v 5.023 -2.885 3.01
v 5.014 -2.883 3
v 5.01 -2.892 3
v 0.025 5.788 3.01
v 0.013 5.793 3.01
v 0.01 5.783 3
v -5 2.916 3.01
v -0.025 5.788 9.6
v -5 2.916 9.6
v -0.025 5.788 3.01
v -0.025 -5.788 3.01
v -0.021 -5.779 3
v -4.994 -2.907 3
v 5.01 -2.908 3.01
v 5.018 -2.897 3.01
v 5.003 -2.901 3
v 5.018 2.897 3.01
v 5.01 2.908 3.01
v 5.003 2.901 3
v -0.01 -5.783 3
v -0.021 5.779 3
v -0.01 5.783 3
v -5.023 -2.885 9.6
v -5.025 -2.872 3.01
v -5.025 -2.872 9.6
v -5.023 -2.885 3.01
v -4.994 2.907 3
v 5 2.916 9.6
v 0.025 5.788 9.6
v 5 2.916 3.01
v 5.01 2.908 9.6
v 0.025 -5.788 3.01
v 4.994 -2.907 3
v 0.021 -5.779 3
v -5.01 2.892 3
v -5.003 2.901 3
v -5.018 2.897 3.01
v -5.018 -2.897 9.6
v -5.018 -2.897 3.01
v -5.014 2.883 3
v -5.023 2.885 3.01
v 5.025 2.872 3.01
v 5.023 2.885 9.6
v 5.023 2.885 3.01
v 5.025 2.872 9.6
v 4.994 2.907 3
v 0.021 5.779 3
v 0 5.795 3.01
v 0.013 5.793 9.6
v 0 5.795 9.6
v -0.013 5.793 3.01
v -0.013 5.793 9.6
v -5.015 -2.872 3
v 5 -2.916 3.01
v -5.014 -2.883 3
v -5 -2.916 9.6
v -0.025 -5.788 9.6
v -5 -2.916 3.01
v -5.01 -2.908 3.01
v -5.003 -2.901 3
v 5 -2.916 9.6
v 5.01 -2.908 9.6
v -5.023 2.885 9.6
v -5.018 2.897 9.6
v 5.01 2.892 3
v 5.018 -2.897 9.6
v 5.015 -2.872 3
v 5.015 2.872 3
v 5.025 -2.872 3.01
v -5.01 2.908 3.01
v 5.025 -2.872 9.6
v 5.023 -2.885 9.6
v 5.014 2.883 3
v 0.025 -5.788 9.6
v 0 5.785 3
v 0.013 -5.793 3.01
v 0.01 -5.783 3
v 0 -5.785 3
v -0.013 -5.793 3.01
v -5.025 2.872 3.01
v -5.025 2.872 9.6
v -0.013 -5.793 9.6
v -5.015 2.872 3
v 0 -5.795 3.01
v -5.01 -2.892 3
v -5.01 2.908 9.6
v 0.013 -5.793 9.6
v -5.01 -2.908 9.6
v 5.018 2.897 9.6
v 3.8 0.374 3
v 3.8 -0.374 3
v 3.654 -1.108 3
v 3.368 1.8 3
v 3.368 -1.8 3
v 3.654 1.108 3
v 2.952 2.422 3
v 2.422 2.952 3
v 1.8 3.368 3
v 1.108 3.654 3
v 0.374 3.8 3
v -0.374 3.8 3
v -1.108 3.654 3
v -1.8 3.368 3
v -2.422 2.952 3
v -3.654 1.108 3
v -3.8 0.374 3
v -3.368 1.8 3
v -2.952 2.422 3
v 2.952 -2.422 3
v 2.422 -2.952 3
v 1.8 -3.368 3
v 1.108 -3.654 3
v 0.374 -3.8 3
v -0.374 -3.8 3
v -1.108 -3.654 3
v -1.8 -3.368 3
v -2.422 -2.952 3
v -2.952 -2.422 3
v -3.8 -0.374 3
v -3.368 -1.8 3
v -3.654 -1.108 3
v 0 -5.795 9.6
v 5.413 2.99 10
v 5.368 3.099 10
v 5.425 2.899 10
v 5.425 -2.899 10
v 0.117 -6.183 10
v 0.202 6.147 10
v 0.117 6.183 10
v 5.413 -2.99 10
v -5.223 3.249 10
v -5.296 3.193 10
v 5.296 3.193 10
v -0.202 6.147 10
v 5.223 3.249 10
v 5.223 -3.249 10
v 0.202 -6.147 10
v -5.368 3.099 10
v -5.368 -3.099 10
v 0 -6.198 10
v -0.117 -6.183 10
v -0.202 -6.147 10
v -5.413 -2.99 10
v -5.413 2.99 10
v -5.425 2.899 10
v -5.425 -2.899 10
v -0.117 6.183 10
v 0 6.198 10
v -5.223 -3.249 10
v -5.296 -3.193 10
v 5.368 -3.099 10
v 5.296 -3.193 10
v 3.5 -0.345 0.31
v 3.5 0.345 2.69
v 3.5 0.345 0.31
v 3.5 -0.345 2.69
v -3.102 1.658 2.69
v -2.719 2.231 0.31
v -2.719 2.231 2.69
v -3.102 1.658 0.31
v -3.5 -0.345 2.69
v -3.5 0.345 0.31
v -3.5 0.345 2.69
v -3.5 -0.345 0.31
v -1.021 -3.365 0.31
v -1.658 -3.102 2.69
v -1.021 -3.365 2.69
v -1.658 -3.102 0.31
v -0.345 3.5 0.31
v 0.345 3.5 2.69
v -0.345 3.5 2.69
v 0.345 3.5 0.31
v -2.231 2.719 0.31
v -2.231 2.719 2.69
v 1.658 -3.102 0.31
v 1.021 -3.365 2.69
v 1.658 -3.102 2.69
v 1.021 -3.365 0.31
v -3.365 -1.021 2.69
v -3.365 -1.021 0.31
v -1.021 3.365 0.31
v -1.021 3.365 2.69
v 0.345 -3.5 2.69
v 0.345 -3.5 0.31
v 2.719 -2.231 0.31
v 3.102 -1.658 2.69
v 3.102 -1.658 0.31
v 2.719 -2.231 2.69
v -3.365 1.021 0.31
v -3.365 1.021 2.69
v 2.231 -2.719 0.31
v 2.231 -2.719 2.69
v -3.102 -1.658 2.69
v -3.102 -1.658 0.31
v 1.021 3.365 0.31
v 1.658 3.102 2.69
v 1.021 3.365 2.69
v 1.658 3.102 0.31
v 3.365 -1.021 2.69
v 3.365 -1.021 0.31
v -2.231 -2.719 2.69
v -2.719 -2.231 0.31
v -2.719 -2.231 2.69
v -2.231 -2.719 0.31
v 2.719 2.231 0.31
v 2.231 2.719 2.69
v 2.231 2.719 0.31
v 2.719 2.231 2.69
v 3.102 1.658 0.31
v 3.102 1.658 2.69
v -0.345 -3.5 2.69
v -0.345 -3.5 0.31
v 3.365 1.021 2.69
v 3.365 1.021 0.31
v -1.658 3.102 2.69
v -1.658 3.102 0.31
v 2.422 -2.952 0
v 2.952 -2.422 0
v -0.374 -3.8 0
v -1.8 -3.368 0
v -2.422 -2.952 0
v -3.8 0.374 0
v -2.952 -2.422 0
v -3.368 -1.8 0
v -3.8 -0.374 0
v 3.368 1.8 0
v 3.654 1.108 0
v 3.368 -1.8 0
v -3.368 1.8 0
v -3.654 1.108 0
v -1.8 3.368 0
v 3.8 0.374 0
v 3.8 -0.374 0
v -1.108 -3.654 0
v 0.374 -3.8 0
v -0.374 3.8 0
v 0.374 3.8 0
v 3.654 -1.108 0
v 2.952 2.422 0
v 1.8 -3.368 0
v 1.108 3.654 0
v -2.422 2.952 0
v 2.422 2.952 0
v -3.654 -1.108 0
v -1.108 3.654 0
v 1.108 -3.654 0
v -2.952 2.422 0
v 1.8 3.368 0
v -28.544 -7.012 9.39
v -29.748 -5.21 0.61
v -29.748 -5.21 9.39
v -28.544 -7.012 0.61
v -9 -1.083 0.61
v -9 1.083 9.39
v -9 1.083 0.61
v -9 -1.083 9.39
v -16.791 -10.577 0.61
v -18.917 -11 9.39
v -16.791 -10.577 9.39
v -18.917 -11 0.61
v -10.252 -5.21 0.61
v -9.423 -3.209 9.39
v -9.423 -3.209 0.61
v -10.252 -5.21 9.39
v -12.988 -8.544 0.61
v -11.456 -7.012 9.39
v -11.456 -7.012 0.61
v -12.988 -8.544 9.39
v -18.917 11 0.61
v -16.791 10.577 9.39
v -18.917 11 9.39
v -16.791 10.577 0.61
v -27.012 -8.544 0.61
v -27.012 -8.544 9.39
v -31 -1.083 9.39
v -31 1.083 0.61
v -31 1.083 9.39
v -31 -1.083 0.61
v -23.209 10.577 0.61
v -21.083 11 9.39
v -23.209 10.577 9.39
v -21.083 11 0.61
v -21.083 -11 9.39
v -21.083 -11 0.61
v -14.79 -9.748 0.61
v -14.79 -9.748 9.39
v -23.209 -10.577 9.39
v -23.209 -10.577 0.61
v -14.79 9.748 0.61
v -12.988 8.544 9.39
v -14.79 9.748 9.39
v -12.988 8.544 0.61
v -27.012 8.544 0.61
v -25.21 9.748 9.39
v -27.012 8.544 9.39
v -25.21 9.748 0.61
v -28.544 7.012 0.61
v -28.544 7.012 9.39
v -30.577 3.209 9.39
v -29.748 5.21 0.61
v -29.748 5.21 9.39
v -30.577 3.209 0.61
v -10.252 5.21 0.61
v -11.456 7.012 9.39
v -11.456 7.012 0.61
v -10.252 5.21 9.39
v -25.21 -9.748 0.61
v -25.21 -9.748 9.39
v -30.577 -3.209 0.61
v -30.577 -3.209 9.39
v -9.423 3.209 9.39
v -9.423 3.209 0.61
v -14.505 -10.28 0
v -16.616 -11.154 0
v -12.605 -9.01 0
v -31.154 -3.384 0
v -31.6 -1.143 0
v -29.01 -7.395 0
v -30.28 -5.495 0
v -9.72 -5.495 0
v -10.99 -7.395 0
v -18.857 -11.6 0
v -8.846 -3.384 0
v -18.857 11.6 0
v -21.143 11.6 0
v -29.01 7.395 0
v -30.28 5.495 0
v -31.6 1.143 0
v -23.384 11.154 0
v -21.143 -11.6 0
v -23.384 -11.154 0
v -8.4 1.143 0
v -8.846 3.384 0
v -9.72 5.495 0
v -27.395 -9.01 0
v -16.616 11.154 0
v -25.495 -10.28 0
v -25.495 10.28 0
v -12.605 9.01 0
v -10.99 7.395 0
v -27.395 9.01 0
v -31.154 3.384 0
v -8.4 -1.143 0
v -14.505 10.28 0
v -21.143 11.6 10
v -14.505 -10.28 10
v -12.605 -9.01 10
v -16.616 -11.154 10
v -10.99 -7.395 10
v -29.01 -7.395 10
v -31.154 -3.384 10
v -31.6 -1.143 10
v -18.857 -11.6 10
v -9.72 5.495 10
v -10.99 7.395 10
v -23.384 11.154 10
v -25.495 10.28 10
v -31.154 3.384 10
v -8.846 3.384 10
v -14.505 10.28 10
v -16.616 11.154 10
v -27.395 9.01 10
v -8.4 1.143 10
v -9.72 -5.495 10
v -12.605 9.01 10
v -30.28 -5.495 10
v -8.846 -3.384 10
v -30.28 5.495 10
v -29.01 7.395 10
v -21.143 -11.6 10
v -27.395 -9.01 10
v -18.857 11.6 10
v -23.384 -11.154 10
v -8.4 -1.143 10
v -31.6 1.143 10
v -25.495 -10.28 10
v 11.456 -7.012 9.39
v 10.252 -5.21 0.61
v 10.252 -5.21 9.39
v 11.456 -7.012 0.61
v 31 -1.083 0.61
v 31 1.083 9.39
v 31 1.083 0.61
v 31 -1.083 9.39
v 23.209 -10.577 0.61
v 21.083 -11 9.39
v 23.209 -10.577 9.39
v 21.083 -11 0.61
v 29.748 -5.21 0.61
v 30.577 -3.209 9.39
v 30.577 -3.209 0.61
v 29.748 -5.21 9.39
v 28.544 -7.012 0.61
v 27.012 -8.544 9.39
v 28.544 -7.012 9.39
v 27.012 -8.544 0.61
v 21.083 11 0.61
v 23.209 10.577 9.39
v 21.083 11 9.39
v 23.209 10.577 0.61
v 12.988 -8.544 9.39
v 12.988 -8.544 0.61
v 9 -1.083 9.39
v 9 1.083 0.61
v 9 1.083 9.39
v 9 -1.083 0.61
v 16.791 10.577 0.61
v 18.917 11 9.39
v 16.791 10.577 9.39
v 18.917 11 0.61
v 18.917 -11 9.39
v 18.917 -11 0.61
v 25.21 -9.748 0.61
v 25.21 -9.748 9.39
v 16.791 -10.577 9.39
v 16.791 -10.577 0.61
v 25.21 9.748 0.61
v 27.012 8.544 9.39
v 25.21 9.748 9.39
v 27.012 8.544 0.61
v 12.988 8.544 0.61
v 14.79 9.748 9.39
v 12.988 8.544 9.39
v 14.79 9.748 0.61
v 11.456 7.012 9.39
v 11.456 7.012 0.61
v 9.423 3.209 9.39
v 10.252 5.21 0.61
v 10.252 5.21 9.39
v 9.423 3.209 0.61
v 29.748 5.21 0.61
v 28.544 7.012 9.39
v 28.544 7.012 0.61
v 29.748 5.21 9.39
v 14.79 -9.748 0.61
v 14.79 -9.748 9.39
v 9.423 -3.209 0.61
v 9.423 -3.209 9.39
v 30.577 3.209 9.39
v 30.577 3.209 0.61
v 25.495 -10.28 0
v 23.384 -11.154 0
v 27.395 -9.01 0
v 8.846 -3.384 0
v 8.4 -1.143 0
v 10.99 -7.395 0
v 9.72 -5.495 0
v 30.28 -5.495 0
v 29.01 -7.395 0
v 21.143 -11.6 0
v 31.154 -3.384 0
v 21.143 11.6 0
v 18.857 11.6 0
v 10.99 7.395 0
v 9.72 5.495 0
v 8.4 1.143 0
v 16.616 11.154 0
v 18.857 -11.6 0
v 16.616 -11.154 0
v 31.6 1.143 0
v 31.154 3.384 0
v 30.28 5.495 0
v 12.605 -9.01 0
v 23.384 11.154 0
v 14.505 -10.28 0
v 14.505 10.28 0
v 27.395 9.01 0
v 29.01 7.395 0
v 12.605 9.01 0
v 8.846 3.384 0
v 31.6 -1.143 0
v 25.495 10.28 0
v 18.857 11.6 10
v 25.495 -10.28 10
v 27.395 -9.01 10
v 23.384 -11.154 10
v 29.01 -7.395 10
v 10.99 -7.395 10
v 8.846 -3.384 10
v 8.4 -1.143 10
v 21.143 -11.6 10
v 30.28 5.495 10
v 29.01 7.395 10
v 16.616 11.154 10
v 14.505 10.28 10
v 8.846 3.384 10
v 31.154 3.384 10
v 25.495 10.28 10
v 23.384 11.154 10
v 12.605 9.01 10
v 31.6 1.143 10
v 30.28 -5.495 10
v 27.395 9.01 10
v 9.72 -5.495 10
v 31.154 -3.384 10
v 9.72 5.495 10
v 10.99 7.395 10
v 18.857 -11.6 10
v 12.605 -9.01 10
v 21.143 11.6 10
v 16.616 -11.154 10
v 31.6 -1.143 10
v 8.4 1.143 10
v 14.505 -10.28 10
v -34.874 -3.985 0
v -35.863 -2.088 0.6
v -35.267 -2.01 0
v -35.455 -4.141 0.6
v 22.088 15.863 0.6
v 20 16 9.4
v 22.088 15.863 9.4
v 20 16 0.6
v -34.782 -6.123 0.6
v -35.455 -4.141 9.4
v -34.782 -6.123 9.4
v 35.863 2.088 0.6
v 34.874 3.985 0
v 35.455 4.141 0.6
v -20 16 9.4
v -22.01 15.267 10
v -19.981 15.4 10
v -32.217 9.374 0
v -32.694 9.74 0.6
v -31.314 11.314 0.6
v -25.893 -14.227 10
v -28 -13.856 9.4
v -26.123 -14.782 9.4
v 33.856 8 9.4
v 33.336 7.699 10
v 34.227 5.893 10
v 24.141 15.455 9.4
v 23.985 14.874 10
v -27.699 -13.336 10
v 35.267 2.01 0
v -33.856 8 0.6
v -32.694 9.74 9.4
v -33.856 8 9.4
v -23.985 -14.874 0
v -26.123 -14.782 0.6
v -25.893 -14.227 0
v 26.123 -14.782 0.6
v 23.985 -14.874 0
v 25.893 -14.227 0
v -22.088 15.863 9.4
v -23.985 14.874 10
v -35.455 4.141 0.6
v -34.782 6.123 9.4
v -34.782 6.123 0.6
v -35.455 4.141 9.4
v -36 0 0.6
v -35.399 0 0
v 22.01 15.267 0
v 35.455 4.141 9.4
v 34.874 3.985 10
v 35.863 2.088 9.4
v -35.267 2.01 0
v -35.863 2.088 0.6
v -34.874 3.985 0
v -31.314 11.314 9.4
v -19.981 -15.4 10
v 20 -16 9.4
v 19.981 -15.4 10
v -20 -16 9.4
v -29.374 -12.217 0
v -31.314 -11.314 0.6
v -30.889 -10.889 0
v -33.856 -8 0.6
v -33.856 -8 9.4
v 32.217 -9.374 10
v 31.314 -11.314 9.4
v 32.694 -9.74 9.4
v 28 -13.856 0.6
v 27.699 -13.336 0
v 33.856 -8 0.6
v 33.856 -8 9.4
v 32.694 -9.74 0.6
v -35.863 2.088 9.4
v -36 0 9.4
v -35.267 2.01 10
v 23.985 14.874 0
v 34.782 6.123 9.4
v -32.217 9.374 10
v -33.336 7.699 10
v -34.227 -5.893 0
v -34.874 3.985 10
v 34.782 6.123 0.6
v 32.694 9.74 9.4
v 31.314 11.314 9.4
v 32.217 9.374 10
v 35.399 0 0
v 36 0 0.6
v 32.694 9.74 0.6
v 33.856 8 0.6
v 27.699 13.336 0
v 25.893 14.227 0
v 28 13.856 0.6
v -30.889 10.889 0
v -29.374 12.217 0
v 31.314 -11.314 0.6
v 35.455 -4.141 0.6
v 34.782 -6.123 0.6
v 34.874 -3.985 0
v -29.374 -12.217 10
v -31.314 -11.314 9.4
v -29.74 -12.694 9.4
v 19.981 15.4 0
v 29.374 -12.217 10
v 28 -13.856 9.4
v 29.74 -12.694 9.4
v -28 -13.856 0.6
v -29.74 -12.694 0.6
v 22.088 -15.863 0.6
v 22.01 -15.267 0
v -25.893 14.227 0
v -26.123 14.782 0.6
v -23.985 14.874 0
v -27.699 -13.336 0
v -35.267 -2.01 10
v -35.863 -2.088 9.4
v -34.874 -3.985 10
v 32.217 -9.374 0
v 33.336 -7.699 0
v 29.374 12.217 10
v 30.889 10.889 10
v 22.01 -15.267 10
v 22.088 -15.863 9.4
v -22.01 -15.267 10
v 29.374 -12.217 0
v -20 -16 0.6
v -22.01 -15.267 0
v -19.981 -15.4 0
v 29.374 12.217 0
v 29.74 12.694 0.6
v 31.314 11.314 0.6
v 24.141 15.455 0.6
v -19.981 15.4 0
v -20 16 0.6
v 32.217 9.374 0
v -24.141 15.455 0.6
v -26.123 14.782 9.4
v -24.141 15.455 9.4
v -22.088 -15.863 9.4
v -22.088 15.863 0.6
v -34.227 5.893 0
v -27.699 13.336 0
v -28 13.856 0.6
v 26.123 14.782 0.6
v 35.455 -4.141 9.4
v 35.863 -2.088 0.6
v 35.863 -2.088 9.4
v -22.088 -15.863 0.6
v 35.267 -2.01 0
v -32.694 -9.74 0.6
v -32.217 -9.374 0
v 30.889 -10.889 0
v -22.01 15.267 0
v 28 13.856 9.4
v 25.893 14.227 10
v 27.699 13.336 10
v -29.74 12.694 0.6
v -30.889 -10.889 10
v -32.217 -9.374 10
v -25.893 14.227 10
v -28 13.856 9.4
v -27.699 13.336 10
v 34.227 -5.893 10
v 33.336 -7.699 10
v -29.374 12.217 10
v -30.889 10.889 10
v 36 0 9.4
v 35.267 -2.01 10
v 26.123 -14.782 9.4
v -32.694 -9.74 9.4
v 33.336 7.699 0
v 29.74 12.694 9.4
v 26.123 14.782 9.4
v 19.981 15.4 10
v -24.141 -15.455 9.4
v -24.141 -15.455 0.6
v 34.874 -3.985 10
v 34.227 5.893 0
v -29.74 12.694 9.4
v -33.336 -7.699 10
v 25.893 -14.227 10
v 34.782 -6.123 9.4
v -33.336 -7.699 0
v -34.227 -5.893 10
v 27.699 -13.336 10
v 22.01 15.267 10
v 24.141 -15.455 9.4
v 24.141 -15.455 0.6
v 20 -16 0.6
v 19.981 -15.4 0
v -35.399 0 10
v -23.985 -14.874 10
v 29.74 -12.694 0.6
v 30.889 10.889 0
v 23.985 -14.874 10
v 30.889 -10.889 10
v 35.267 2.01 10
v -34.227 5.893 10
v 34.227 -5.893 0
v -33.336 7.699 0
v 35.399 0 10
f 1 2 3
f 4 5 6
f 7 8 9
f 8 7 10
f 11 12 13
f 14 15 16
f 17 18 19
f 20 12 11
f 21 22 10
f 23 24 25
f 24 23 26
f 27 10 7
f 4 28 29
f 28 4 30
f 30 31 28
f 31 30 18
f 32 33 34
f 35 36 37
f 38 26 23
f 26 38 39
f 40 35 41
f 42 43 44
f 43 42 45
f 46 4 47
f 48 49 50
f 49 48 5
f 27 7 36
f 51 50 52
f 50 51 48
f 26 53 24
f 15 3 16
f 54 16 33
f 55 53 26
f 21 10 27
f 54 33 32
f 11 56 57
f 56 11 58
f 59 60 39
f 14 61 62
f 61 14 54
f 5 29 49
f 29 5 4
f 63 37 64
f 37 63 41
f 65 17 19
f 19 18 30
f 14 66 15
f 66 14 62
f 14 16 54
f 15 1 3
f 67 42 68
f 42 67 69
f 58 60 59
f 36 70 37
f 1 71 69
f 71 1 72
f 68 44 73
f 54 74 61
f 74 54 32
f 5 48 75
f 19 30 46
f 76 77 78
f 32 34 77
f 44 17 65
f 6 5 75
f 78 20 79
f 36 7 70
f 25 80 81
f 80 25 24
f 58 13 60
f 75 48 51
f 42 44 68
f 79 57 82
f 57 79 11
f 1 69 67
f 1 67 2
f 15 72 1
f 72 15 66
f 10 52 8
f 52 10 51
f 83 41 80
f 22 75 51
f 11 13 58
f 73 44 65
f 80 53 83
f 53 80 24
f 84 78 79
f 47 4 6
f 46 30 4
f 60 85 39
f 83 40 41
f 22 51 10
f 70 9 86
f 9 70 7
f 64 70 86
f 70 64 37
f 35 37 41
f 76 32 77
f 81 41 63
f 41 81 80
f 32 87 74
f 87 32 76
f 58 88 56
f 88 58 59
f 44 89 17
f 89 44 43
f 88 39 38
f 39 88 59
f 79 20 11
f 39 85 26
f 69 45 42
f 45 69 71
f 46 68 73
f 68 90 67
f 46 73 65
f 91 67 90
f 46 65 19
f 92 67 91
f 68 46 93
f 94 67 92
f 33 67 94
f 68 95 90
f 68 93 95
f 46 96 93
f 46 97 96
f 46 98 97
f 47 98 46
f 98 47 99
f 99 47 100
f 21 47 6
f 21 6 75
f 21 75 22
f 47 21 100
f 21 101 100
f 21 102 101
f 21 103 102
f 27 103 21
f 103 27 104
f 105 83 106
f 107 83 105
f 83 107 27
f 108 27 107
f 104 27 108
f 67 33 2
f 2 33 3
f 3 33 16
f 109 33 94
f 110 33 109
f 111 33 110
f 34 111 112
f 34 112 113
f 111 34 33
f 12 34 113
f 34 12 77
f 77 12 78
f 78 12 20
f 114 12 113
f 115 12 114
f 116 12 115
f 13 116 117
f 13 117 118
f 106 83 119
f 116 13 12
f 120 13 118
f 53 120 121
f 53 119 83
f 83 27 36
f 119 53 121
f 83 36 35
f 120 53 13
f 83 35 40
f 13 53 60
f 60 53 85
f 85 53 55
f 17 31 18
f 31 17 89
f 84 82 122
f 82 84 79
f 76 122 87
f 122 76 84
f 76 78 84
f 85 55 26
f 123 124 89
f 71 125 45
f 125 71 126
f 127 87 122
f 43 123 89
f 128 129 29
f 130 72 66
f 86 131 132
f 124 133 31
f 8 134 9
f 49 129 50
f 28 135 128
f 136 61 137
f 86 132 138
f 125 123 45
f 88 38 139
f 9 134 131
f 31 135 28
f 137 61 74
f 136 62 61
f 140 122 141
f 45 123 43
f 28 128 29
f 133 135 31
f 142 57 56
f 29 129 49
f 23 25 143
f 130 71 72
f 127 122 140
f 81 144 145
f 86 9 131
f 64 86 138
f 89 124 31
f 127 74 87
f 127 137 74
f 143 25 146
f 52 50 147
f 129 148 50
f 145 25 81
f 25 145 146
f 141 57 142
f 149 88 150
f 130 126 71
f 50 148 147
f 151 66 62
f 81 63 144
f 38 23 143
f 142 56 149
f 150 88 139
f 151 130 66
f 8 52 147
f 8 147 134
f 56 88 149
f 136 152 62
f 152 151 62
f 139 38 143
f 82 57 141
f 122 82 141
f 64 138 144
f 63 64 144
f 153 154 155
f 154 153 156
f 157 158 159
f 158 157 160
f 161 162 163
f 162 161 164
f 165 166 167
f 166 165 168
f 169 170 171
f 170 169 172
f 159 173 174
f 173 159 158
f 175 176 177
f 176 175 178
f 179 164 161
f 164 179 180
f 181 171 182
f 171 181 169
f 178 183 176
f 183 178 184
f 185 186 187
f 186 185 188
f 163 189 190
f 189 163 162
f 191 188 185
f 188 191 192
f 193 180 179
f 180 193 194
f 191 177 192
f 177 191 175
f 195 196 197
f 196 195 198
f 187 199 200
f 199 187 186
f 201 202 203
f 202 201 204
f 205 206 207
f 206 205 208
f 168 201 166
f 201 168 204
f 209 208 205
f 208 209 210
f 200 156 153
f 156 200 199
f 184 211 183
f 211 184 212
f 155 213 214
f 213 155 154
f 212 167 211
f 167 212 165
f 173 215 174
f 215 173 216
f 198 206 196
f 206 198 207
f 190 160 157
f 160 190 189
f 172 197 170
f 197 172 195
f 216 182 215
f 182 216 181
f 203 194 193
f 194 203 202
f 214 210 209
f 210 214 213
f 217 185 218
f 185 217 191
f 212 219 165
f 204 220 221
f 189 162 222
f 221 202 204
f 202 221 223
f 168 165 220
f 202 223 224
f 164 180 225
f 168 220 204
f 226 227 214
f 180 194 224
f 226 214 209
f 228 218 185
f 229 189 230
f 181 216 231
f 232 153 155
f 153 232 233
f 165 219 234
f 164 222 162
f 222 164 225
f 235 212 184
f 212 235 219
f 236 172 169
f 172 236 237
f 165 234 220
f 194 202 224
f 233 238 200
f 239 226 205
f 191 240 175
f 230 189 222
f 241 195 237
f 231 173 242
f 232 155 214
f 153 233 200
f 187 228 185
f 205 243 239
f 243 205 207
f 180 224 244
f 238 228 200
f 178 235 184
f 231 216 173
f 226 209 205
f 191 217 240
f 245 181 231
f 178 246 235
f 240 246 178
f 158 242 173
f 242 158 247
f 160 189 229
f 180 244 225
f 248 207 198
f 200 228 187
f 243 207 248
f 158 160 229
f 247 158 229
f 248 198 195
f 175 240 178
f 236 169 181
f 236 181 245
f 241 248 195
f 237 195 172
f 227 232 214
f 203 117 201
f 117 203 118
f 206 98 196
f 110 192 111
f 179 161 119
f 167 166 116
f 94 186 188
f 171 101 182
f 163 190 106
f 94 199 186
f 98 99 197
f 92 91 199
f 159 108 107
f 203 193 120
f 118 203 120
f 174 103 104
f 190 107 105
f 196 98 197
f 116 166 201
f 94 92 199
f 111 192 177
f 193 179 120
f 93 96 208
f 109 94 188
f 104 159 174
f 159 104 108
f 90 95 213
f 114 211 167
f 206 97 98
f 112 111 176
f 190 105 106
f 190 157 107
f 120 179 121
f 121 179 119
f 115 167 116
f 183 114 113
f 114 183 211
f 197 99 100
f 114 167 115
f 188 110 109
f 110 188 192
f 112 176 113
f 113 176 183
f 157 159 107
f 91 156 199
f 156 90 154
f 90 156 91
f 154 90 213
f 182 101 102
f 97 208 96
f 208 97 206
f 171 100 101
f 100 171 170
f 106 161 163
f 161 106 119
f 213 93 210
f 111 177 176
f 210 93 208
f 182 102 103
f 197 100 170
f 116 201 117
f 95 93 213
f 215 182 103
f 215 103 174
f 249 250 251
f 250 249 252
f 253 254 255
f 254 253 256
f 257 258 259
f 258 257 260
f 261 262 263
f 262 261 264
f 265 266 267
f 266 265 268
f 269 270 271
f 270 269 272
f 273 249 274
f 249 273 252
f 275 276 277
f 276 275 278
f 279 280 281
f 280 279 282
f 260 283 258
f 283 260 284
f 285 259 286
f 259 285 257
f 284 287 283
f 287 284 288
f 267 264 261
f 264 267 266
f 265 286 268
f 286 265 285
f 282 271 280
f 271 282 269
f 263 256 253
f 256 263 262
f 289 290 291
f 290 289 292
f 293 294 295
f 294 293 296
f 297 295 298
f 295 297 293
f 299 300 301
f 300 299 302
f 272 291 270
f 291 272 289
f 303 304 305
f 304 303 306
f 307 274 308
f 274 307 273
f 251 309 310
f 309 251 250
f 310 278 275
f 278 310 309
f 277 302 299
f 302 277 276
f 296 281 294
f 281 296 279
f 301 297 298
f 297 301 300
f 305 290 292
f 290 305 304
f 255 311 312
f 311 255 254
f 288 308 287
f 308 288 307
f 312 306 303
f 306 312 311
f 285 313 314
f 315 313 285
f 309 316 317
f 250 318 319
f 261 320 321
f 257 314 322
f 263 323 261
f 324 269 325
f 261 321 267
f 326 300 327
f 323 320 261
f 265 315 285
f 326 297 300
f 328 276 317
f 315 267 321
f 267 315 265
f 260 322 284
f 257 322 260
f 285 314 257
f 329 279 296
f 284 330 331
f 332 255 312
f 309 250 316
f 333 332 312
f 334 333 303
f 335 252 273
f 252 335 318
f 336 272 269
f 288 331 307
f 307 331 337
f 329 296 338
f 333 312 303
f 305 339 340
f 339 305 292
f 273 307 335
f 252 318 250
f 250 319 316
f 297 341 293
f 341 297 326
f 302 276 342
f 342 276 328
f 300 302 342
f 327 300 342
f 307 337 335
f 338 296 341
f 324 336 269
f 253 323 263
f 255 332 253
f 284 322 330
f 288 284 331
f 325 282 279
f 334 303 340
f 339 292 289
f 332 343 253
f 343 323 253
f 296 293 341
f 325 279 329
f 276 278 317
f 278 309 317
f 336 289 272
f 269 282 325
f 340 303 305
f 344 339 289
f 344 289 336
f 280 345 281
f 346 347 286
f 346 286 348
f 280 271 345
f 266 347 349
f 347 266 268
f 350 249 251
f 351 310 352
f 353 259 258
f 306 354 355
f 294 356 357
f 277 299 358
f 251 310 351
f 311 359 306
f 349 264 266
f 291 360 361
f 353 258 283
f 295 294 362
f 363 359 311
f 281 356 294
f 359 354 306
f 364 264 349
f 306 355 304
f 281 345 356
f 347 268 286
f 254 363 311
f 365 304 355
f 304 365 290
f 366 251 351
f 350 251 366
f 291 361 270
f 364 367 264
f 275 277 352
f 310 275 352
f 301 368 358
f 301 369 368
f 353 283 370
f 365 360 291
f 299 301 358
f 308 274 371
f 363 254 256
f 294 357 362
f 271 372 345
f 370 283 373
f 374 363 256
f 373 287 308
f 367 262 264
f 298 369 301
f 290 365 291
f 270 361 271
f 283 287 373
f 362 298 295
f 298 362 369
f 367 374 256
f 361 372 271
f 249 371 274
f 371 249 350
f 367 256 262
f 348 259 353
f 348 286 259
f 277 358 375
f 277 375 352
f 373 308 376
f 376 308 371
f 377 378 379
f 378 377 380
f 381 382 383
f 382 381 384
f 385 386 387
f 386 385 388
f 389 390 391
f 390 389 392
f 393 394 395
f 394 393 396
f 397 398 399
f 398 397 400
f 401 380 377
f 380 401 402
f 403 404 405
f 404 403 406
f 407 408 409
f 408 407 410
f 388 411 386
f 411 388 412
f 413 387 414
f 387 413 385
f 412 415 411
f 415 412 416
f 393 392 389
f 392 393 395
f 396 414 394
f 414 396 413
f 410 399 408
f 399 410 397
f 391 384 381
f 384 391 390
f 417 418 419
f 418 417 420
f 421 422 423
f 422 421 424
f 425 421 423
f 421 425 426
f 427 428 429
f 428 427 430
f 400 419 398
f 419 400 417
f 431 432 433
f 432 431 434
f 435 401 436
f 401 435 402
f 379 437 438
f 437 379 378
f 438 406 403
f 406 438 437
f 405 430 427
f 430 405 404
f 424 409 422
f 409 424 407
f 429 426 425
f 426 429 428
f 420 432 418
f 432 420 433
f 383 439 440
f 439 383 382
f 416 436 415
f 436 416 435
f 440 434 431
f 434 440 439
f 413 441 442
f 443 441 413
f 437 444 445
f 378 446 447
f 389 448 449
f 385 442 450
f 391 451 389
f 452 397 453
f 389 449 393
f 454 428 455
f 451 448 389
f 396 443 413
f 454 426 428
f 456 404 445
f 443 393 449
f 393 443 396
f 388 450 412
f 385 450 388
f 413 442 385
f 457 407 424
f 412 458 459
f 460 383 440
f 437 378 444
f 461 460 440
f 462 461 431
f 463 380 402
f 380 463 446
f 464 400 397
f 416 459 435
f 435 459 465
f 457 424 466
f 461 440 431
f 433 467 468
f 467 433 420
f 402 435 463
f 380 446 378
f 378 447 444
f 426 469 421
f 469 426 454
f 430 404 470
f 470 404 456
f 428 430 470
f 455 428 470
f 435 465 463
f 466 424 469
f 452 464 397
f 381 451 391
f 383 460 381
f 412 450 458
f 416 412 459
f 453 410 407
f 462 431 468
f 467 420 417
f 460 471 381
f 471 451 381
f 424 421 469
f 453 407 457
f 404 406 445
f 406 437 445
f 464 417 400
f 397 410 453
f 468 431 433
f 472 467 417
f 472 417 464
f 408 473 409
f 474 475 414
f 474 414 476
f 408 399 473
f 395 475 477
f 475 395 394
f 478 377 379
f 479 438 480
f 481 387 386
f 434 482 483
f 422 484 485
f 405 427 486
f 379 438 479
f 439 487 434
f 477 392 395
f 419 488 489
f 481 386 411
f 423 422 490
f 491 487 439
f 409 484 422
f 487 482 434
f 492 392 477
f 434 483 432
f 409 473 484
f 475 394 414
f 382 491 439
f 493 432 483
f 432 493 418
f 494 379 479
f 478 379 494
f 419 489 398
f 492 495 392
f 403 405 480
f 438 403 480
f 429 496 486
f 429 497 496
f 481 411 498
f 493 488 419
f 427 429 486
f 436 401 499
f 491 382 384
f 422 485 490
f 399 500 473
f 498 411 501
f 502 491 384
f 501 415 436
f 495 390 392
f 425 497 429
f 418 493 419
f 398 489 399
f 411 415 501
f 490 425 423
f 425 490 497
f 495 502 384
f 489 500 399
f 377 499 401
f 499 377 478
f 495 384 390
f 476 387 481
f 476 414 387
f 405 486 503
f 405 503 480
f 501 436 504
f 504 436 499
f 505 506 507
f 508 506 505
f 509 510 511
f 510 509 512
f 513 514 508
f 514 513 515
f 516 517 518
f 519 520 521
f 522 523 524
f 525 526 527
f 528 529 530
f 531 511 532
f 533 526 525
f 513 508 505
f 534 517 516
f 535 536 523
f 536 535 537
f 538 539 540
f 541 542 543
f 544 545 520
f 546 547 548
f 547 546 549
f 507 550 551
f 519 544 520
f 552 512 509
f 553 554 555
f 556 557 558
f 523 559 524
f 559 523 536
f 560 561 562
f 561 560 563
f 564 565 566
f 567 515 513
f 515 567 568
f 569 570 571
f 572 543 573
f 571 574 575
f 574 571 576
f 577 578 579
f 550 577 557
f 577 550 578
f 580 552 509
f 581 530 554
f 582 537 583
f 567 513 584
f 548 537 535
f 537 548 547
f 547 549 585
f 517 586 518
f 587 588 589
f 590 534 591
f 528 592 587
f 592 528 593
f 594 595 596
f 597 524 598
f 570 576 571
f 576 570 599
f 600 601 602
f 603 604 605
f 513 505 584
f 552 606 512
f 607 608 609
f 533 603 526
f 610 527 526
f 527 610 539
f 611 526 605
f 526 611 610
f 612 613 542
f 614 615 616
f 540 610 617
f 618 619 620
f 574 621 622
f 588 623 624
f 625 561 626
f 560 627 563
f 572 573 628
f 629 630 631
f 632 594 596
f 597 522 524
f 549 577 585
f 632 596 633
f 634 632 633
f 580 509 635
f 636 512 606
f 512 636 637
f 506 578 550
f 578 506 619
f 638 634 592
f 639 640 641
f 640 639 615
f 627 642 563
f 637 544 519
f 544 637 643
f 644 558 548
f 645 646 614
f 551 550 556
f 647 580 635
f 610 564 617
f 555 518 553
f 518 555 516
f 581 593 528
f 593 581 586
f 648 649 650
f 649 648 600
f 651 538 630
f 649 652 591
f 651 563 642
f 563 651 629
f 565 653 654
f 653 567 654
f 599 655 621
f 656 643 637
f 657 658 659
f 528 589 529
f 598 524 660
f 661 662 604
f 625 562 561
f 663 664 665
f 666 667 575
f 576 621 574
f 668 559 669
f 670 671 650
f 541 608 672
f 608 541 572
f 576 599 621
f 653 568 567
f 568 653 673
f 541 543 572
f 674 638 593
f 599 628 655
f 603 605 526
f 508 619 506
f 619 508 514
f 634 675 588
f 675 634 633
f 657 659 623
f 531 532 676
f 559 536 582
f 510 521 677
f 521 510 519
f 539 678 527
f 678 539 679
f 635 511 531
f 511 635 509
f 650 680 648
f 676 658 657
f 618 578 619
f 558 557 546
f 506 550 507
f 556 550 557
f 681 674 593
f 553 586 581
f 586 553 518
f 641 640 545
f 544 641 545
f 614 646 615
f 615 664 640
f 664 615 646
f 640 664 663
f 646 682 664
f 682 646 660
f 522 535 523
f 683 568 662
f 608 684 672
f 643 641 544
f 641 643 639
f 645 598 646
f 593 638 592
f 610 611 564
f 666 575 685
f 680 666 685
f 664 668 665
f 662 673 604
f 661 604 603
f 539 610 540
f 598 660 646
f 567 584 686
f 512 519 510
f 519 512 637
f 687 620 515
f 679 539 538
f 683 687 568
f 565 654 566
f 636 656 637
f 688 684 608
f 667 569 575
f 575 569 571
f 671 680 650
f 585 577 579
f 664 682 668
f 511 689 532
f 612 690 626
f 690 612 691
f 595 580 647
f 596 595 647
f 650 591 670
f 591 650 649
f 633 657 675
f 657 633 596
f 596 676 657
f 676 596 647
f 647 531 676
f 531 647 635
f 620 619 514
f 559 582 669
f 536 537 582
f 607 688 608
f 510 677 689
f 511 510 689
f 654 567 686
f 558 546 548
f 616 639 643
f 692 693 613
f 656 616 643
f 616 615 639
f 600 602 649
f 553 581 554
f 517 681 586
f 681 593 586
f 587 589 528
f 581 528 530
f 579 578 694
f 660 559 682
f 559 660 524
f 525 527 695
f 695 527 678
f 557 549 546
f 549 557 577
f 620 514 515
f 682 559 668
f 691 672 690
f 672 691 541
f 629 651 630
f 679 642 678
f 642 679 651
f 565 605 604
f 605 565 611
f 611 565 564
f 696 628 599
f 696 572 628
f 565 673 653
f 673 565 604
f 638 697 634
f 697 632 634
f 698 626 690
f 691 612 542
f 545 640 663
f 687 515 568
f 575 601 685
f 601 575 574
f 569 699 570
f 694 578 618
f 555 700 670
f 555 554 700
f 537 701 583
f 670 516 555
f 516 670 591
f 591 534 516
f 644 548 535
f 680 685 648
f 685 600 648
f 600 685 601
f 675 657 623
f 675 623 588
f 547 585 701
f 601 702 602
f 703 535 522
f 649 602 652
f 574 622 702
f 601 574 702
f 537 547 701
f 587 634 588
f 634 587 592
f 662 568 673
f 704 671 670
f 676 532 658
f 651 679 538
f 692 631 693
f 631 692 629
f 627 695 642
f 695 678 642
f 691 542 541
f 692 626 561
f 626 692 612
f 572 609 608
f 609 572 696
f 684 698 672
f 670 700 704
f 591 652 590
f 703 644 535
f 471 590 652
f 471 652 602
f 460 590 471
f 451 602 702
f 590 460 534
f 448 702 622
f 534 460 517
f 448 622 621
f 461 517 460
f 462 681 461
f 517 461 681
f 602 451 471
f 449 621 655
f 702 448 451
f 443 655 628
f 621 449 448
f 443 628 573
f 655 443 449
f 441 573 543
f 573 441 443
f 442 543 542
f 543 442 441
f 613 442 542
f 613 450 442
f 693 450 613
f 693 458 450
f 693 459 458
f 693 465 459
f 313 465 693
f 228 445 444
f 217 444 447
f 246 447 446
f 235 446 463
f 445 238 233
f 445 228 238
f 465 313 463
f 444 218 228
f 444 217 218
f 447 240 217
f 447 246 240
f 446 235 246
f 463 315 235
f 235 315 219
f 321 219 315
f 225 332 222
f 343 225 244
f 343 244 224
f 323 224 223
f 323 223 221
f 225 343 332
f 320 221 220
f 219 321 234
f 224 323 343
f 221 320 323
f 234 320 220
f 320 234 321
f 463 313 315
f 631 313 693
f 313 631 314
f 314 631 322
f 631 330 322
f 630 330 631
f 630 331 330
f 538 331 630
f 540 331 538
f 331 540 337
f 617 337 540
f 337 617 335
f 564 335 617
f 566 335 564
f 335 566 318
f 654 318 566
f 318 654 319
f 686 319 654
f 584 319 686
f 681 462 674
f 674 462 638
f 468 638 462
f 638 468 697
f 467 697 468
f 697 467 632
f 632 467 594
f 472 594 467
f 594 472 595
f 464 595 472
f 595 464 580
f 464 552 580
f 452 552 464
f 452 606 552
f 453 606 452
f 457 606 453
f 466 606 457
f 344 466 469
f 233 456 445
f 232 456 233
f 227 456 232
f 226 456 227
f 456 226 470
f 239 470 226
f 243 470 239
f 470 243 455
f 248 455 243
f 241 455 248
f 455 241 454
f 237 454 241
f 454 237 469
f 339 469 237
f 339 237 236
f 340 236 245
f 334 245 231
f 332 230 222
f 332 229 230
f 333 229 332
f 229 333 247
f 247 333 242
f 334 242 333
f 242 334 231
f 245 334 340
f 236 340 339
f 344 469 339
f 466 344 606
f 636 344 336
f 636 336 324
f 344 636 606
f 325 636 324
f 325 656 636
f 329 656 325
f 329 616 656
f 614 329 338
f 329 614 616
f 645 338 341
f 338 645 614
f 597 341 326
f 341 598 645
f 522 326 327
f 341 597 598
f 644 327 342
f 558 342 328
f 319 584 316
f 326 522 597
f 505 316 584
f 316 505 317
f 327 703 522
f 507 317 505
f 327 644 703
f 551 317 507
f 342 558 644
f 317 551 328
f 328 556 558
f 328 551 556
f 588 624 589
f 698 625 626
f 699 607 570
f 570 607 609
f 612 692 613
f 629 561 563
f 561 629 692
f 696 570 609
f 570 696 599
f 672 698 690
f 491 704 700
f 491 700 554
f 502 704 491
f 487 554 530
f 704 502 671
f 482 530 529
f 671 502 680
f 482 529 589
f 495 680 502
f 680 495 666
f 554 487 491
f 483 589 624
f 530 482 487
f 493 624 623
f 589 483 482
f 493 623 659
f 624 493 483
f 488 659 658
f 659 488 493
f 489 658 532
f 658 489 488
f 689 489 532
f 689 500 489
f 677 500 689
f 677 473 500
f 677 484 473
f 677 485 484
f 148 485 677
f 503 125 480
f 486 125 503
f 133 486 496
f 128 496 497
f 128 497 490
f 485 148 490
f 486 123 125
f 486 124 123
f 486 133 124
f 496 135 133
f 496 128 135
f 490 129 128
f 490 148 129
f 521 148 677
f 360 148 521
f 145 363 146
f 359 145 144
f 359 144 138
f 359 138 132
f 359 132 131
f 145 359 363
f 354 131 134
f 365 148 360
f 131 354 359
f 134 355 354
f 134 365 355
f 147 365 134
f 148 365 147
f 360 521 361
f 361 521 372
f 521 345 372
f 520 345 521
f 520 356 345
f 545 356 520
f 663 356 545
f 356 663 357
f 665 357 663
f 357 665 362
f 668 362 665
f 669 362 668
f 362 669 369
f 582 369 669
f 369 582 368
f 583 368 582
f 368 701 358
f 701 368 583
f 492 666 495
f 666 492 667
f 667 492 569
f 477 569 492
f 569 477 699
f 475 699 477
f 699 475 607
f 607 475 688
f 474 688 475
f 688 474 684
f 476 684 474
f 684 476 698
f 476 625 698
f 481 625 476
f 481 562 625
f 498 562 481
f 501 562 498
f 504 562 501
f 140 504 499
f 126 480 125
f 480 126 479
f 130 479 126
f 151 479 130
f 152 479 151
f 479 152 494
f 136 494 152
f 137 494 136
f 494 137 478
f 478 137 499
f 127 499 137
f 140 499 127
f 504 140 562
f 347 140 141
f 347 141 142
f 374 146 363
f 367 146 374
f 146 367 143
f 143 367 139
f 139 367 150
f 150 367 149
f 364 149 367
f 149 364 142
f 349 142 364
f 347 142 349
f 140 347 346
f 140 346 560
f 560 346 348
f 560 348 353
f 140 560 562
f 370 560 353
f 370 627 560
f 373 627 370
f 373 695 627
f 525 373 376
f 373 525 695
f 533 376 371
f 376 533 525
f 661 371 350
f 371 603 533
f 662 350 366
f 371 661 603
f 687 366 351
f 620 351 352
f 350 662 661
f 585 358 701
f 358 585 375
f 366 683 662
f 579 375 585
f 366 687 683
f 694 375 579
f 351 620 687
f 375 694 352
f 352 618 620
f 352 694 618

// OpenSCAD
// file: ../../../../scad/lib/edge_finished_profiles.scad
// Local positive primitives are finished before functional cuts.
use <util.scad>
module ef_round_rect(w,l,r) {
    safe_r=min(r,w/2-0.01,l/2-0.01);
    translate([-w/2,-l/2]) projection(cut=true) rrect_prism(w,l,1,safe_r);
}
module ef_capsule(w,l) {
    assert(l>=w && w>0);
    hull() for(s=[-1,1]) translate([0,s*(l-w)/2]) circle(d=w,$fn=48);
}
module ef_profile(t,c=0.6) {
    // Compensated local profile, exact extrema and thickness. This is not a
    // blanket Minkowski of a completed part or assembly. Cuts are restored last.
    assert(t>2*c && c>0);
    minkowski() {
        translate([0,0,c]) linear_extrude(t-2*c) offset(delta=-c) children();
        union() {
            translate([0,0,-c]) cylinder(r1=0,r2=c,h=c,$fn=16);
            cylinder(r1=c,r2=0,h=c,$fn=16);
        }
    }
}
module ef_convex_profile(t,c=0.6) {
    // Exact offset loft for convex profiles: avoids unnecessary 3D Minkowski
    // triangulation on large plates and bosses. Nonconvex profiles use ef_profile.
    assert(t>2*c && c>0);
    hull() {
        linear_extrude(0.01) offset(delta=-c) children();
        translate([0,0,c]) linear_extrude(t-2*c) children();
        translate([0,0,t-0.01]) linear_extrude(0.01) offset(delta=-c) children();
    }
}
module ef_cut(t,c=0.6) {
    translate([0,0,-0.1]) linear_extrude(t+0.2) children();
    hull() {
        translate([0,0,-0.01]) linear_extrude(0.01) offset(delta=c) children();
        translate([0,0,c]) linear_extrude(0.01) children();
    }
    hull() {
        translate([0,0,t-c-0.01]) linear_extrude(0.01) children();
        translate([0,0,t]) linear_extrude(0.01) offset(delta=c) children();
    }
}
module ef_bore(d,t,c=0.3) { ef_cut(t,c) circle(d=d,$fn=32); }
// Diameter is the inscribed circle: polygon flats preserve the shaft clearance.
module ef_poly_bore(d,t,c=0.3,sides=8) {
    assert(sides>=6 && sides==floor(sides));
    ef_cut(t,c) rotate(180/sides) circle(r=d/2/cos(180/sides),$fn=sides);
}
module ef_box(w,l,t,r=2,c=0.6) { ef_convex_profile(t,c) ef_round_rect(w,l,r); }
module ef_hex(af) { rotate(30) circle(d=af/cos(30),$fn=6); }
module ef_plan_finish(r=2) {
    // Closing rounds concave roots; opening rounds convex corners. Exact planar
    // extrema and straight functional flats are retained.
    offset(r=r) offset(delta=-r) offset(delta=-r) offset(r=r) children();
}
module ef_root(w,l,r=1,corner=2) {
    // Local 45-degree relief where a boss meets a plate (place at plate top).
    hull() {
        linear_extrude(0.01) ef_round_rect(w+2*r,l+2*r,corner+r);
        // End strictly inside the boss. An exact tangent match of the two
        // independently tessellated rounded profiles creates microscopic lips.
        translate([0,0,r+0.3]) linear_extrude(0.01)
            offset(delta=-0.3) ef_round_rect(w,l,corner);
    }
}
// main file
// Canonical source, millimetres. Print flat, Z=0 on bed.
use <../../../../scad/lib/edge_finished_profiles.scad>
/* [Nut interface] */
nut_af = 10;
af_clearance = 0.05; // Total across-flats difference: 0.025 mm per flat.
socket_corner_r = 0.05;
// Provisional until the actual nut thickness and bolt diameter are measured.
socket_depth = 7;
lid_thickness = 3;
bolt_clearance_d = 7;
floor_chamfer = 0.01;
/* [Grip] */
grip_length = 72;
grip_width = 32;
finger_hole_d = 22;
finger_offset = 20;
edge_chamfer = 0.6;
entry_chamfer = 0.4;
/* [Hidden] */
body_height = socket_depth+lid_thickness;
$fn = 96;
assert(nut_af>0 && af_clearance>0);
assert(grip_length>=grip_width && grip_width>2*(nut_af+af_clearance)/sqrt(3)+4);
assert(body_height>2*max(edge_chamfer,entry_chamfer));
assert(socket_corner_r>0 && edge_chamfer>0 && entry_chamfer>0);
assert(af_clearance/2 > socket_corner_r*(1/cos(30)-1));
assert(floor_chamfer>0 && floor_chamfer<af_clearance/2-socket_corner_r*(1/cos(30)-1));
assert(lid_thickness>2*entry_chamfer && socket_depth>2*entry_chamfer);
assert(bolt_clearance_d+2*entry_chamfer<nut_af);
assert(finger_offset-finger_hole_d/2/cos(180/32)-(nut_af+af_clearance)/sqrt(3)>2);
module socket_profile() {
    // Round hex vertices locally; straight drive flats keep the specified AF.
    offset(r=socket_corner_r,$fn=24) offset(delta=-socket_corner_r)
        ef_hex(nut_af+af_clearance);
}
module nut_pocket() {
    // Floor-root bevel stays within the nut clearance, preserving a flat seat.
    hull() {
        translate([0,0,lid_thickness]) linear_extrude(0.01)
            offset(delta=-floor_chamfer) socket_profile();
        translate([0,0,lid_thickness+floor_chamfer]) linear_extrude(0.01) socket_profile();
    }
    translate([0,0,lid_thickness+floor_chamfer])
        linear_extrude(socket_depth+0.1) socket_profile();
    hull() {
        translate([0,0,body_height-entry_chamfer]) linear_extrude(0.01) socket_profile();
        translate([0,0,body_height]) linear_extrude(0.1)
            offset(delta=entry_chamfer) socket_profile();
    }
}
difference() {
    ef_convex_profile(body_height,edge_chamfer)
        rotate(90) ef_capsule(grip_width,grip_length);
    nut_pocket();
    // Only the bolt crosses the lid; the 10 mm nut cannot pass this opening.
    ef_poly_bore(bolt_clearance_d,lid_thickness,0.3,32);
    for(x=[-finger_offset,finger_offset]) translate([x,0,0])
        ef_poly_bore(finger_hole_d,body_height,edge_chamfer,32);
}
